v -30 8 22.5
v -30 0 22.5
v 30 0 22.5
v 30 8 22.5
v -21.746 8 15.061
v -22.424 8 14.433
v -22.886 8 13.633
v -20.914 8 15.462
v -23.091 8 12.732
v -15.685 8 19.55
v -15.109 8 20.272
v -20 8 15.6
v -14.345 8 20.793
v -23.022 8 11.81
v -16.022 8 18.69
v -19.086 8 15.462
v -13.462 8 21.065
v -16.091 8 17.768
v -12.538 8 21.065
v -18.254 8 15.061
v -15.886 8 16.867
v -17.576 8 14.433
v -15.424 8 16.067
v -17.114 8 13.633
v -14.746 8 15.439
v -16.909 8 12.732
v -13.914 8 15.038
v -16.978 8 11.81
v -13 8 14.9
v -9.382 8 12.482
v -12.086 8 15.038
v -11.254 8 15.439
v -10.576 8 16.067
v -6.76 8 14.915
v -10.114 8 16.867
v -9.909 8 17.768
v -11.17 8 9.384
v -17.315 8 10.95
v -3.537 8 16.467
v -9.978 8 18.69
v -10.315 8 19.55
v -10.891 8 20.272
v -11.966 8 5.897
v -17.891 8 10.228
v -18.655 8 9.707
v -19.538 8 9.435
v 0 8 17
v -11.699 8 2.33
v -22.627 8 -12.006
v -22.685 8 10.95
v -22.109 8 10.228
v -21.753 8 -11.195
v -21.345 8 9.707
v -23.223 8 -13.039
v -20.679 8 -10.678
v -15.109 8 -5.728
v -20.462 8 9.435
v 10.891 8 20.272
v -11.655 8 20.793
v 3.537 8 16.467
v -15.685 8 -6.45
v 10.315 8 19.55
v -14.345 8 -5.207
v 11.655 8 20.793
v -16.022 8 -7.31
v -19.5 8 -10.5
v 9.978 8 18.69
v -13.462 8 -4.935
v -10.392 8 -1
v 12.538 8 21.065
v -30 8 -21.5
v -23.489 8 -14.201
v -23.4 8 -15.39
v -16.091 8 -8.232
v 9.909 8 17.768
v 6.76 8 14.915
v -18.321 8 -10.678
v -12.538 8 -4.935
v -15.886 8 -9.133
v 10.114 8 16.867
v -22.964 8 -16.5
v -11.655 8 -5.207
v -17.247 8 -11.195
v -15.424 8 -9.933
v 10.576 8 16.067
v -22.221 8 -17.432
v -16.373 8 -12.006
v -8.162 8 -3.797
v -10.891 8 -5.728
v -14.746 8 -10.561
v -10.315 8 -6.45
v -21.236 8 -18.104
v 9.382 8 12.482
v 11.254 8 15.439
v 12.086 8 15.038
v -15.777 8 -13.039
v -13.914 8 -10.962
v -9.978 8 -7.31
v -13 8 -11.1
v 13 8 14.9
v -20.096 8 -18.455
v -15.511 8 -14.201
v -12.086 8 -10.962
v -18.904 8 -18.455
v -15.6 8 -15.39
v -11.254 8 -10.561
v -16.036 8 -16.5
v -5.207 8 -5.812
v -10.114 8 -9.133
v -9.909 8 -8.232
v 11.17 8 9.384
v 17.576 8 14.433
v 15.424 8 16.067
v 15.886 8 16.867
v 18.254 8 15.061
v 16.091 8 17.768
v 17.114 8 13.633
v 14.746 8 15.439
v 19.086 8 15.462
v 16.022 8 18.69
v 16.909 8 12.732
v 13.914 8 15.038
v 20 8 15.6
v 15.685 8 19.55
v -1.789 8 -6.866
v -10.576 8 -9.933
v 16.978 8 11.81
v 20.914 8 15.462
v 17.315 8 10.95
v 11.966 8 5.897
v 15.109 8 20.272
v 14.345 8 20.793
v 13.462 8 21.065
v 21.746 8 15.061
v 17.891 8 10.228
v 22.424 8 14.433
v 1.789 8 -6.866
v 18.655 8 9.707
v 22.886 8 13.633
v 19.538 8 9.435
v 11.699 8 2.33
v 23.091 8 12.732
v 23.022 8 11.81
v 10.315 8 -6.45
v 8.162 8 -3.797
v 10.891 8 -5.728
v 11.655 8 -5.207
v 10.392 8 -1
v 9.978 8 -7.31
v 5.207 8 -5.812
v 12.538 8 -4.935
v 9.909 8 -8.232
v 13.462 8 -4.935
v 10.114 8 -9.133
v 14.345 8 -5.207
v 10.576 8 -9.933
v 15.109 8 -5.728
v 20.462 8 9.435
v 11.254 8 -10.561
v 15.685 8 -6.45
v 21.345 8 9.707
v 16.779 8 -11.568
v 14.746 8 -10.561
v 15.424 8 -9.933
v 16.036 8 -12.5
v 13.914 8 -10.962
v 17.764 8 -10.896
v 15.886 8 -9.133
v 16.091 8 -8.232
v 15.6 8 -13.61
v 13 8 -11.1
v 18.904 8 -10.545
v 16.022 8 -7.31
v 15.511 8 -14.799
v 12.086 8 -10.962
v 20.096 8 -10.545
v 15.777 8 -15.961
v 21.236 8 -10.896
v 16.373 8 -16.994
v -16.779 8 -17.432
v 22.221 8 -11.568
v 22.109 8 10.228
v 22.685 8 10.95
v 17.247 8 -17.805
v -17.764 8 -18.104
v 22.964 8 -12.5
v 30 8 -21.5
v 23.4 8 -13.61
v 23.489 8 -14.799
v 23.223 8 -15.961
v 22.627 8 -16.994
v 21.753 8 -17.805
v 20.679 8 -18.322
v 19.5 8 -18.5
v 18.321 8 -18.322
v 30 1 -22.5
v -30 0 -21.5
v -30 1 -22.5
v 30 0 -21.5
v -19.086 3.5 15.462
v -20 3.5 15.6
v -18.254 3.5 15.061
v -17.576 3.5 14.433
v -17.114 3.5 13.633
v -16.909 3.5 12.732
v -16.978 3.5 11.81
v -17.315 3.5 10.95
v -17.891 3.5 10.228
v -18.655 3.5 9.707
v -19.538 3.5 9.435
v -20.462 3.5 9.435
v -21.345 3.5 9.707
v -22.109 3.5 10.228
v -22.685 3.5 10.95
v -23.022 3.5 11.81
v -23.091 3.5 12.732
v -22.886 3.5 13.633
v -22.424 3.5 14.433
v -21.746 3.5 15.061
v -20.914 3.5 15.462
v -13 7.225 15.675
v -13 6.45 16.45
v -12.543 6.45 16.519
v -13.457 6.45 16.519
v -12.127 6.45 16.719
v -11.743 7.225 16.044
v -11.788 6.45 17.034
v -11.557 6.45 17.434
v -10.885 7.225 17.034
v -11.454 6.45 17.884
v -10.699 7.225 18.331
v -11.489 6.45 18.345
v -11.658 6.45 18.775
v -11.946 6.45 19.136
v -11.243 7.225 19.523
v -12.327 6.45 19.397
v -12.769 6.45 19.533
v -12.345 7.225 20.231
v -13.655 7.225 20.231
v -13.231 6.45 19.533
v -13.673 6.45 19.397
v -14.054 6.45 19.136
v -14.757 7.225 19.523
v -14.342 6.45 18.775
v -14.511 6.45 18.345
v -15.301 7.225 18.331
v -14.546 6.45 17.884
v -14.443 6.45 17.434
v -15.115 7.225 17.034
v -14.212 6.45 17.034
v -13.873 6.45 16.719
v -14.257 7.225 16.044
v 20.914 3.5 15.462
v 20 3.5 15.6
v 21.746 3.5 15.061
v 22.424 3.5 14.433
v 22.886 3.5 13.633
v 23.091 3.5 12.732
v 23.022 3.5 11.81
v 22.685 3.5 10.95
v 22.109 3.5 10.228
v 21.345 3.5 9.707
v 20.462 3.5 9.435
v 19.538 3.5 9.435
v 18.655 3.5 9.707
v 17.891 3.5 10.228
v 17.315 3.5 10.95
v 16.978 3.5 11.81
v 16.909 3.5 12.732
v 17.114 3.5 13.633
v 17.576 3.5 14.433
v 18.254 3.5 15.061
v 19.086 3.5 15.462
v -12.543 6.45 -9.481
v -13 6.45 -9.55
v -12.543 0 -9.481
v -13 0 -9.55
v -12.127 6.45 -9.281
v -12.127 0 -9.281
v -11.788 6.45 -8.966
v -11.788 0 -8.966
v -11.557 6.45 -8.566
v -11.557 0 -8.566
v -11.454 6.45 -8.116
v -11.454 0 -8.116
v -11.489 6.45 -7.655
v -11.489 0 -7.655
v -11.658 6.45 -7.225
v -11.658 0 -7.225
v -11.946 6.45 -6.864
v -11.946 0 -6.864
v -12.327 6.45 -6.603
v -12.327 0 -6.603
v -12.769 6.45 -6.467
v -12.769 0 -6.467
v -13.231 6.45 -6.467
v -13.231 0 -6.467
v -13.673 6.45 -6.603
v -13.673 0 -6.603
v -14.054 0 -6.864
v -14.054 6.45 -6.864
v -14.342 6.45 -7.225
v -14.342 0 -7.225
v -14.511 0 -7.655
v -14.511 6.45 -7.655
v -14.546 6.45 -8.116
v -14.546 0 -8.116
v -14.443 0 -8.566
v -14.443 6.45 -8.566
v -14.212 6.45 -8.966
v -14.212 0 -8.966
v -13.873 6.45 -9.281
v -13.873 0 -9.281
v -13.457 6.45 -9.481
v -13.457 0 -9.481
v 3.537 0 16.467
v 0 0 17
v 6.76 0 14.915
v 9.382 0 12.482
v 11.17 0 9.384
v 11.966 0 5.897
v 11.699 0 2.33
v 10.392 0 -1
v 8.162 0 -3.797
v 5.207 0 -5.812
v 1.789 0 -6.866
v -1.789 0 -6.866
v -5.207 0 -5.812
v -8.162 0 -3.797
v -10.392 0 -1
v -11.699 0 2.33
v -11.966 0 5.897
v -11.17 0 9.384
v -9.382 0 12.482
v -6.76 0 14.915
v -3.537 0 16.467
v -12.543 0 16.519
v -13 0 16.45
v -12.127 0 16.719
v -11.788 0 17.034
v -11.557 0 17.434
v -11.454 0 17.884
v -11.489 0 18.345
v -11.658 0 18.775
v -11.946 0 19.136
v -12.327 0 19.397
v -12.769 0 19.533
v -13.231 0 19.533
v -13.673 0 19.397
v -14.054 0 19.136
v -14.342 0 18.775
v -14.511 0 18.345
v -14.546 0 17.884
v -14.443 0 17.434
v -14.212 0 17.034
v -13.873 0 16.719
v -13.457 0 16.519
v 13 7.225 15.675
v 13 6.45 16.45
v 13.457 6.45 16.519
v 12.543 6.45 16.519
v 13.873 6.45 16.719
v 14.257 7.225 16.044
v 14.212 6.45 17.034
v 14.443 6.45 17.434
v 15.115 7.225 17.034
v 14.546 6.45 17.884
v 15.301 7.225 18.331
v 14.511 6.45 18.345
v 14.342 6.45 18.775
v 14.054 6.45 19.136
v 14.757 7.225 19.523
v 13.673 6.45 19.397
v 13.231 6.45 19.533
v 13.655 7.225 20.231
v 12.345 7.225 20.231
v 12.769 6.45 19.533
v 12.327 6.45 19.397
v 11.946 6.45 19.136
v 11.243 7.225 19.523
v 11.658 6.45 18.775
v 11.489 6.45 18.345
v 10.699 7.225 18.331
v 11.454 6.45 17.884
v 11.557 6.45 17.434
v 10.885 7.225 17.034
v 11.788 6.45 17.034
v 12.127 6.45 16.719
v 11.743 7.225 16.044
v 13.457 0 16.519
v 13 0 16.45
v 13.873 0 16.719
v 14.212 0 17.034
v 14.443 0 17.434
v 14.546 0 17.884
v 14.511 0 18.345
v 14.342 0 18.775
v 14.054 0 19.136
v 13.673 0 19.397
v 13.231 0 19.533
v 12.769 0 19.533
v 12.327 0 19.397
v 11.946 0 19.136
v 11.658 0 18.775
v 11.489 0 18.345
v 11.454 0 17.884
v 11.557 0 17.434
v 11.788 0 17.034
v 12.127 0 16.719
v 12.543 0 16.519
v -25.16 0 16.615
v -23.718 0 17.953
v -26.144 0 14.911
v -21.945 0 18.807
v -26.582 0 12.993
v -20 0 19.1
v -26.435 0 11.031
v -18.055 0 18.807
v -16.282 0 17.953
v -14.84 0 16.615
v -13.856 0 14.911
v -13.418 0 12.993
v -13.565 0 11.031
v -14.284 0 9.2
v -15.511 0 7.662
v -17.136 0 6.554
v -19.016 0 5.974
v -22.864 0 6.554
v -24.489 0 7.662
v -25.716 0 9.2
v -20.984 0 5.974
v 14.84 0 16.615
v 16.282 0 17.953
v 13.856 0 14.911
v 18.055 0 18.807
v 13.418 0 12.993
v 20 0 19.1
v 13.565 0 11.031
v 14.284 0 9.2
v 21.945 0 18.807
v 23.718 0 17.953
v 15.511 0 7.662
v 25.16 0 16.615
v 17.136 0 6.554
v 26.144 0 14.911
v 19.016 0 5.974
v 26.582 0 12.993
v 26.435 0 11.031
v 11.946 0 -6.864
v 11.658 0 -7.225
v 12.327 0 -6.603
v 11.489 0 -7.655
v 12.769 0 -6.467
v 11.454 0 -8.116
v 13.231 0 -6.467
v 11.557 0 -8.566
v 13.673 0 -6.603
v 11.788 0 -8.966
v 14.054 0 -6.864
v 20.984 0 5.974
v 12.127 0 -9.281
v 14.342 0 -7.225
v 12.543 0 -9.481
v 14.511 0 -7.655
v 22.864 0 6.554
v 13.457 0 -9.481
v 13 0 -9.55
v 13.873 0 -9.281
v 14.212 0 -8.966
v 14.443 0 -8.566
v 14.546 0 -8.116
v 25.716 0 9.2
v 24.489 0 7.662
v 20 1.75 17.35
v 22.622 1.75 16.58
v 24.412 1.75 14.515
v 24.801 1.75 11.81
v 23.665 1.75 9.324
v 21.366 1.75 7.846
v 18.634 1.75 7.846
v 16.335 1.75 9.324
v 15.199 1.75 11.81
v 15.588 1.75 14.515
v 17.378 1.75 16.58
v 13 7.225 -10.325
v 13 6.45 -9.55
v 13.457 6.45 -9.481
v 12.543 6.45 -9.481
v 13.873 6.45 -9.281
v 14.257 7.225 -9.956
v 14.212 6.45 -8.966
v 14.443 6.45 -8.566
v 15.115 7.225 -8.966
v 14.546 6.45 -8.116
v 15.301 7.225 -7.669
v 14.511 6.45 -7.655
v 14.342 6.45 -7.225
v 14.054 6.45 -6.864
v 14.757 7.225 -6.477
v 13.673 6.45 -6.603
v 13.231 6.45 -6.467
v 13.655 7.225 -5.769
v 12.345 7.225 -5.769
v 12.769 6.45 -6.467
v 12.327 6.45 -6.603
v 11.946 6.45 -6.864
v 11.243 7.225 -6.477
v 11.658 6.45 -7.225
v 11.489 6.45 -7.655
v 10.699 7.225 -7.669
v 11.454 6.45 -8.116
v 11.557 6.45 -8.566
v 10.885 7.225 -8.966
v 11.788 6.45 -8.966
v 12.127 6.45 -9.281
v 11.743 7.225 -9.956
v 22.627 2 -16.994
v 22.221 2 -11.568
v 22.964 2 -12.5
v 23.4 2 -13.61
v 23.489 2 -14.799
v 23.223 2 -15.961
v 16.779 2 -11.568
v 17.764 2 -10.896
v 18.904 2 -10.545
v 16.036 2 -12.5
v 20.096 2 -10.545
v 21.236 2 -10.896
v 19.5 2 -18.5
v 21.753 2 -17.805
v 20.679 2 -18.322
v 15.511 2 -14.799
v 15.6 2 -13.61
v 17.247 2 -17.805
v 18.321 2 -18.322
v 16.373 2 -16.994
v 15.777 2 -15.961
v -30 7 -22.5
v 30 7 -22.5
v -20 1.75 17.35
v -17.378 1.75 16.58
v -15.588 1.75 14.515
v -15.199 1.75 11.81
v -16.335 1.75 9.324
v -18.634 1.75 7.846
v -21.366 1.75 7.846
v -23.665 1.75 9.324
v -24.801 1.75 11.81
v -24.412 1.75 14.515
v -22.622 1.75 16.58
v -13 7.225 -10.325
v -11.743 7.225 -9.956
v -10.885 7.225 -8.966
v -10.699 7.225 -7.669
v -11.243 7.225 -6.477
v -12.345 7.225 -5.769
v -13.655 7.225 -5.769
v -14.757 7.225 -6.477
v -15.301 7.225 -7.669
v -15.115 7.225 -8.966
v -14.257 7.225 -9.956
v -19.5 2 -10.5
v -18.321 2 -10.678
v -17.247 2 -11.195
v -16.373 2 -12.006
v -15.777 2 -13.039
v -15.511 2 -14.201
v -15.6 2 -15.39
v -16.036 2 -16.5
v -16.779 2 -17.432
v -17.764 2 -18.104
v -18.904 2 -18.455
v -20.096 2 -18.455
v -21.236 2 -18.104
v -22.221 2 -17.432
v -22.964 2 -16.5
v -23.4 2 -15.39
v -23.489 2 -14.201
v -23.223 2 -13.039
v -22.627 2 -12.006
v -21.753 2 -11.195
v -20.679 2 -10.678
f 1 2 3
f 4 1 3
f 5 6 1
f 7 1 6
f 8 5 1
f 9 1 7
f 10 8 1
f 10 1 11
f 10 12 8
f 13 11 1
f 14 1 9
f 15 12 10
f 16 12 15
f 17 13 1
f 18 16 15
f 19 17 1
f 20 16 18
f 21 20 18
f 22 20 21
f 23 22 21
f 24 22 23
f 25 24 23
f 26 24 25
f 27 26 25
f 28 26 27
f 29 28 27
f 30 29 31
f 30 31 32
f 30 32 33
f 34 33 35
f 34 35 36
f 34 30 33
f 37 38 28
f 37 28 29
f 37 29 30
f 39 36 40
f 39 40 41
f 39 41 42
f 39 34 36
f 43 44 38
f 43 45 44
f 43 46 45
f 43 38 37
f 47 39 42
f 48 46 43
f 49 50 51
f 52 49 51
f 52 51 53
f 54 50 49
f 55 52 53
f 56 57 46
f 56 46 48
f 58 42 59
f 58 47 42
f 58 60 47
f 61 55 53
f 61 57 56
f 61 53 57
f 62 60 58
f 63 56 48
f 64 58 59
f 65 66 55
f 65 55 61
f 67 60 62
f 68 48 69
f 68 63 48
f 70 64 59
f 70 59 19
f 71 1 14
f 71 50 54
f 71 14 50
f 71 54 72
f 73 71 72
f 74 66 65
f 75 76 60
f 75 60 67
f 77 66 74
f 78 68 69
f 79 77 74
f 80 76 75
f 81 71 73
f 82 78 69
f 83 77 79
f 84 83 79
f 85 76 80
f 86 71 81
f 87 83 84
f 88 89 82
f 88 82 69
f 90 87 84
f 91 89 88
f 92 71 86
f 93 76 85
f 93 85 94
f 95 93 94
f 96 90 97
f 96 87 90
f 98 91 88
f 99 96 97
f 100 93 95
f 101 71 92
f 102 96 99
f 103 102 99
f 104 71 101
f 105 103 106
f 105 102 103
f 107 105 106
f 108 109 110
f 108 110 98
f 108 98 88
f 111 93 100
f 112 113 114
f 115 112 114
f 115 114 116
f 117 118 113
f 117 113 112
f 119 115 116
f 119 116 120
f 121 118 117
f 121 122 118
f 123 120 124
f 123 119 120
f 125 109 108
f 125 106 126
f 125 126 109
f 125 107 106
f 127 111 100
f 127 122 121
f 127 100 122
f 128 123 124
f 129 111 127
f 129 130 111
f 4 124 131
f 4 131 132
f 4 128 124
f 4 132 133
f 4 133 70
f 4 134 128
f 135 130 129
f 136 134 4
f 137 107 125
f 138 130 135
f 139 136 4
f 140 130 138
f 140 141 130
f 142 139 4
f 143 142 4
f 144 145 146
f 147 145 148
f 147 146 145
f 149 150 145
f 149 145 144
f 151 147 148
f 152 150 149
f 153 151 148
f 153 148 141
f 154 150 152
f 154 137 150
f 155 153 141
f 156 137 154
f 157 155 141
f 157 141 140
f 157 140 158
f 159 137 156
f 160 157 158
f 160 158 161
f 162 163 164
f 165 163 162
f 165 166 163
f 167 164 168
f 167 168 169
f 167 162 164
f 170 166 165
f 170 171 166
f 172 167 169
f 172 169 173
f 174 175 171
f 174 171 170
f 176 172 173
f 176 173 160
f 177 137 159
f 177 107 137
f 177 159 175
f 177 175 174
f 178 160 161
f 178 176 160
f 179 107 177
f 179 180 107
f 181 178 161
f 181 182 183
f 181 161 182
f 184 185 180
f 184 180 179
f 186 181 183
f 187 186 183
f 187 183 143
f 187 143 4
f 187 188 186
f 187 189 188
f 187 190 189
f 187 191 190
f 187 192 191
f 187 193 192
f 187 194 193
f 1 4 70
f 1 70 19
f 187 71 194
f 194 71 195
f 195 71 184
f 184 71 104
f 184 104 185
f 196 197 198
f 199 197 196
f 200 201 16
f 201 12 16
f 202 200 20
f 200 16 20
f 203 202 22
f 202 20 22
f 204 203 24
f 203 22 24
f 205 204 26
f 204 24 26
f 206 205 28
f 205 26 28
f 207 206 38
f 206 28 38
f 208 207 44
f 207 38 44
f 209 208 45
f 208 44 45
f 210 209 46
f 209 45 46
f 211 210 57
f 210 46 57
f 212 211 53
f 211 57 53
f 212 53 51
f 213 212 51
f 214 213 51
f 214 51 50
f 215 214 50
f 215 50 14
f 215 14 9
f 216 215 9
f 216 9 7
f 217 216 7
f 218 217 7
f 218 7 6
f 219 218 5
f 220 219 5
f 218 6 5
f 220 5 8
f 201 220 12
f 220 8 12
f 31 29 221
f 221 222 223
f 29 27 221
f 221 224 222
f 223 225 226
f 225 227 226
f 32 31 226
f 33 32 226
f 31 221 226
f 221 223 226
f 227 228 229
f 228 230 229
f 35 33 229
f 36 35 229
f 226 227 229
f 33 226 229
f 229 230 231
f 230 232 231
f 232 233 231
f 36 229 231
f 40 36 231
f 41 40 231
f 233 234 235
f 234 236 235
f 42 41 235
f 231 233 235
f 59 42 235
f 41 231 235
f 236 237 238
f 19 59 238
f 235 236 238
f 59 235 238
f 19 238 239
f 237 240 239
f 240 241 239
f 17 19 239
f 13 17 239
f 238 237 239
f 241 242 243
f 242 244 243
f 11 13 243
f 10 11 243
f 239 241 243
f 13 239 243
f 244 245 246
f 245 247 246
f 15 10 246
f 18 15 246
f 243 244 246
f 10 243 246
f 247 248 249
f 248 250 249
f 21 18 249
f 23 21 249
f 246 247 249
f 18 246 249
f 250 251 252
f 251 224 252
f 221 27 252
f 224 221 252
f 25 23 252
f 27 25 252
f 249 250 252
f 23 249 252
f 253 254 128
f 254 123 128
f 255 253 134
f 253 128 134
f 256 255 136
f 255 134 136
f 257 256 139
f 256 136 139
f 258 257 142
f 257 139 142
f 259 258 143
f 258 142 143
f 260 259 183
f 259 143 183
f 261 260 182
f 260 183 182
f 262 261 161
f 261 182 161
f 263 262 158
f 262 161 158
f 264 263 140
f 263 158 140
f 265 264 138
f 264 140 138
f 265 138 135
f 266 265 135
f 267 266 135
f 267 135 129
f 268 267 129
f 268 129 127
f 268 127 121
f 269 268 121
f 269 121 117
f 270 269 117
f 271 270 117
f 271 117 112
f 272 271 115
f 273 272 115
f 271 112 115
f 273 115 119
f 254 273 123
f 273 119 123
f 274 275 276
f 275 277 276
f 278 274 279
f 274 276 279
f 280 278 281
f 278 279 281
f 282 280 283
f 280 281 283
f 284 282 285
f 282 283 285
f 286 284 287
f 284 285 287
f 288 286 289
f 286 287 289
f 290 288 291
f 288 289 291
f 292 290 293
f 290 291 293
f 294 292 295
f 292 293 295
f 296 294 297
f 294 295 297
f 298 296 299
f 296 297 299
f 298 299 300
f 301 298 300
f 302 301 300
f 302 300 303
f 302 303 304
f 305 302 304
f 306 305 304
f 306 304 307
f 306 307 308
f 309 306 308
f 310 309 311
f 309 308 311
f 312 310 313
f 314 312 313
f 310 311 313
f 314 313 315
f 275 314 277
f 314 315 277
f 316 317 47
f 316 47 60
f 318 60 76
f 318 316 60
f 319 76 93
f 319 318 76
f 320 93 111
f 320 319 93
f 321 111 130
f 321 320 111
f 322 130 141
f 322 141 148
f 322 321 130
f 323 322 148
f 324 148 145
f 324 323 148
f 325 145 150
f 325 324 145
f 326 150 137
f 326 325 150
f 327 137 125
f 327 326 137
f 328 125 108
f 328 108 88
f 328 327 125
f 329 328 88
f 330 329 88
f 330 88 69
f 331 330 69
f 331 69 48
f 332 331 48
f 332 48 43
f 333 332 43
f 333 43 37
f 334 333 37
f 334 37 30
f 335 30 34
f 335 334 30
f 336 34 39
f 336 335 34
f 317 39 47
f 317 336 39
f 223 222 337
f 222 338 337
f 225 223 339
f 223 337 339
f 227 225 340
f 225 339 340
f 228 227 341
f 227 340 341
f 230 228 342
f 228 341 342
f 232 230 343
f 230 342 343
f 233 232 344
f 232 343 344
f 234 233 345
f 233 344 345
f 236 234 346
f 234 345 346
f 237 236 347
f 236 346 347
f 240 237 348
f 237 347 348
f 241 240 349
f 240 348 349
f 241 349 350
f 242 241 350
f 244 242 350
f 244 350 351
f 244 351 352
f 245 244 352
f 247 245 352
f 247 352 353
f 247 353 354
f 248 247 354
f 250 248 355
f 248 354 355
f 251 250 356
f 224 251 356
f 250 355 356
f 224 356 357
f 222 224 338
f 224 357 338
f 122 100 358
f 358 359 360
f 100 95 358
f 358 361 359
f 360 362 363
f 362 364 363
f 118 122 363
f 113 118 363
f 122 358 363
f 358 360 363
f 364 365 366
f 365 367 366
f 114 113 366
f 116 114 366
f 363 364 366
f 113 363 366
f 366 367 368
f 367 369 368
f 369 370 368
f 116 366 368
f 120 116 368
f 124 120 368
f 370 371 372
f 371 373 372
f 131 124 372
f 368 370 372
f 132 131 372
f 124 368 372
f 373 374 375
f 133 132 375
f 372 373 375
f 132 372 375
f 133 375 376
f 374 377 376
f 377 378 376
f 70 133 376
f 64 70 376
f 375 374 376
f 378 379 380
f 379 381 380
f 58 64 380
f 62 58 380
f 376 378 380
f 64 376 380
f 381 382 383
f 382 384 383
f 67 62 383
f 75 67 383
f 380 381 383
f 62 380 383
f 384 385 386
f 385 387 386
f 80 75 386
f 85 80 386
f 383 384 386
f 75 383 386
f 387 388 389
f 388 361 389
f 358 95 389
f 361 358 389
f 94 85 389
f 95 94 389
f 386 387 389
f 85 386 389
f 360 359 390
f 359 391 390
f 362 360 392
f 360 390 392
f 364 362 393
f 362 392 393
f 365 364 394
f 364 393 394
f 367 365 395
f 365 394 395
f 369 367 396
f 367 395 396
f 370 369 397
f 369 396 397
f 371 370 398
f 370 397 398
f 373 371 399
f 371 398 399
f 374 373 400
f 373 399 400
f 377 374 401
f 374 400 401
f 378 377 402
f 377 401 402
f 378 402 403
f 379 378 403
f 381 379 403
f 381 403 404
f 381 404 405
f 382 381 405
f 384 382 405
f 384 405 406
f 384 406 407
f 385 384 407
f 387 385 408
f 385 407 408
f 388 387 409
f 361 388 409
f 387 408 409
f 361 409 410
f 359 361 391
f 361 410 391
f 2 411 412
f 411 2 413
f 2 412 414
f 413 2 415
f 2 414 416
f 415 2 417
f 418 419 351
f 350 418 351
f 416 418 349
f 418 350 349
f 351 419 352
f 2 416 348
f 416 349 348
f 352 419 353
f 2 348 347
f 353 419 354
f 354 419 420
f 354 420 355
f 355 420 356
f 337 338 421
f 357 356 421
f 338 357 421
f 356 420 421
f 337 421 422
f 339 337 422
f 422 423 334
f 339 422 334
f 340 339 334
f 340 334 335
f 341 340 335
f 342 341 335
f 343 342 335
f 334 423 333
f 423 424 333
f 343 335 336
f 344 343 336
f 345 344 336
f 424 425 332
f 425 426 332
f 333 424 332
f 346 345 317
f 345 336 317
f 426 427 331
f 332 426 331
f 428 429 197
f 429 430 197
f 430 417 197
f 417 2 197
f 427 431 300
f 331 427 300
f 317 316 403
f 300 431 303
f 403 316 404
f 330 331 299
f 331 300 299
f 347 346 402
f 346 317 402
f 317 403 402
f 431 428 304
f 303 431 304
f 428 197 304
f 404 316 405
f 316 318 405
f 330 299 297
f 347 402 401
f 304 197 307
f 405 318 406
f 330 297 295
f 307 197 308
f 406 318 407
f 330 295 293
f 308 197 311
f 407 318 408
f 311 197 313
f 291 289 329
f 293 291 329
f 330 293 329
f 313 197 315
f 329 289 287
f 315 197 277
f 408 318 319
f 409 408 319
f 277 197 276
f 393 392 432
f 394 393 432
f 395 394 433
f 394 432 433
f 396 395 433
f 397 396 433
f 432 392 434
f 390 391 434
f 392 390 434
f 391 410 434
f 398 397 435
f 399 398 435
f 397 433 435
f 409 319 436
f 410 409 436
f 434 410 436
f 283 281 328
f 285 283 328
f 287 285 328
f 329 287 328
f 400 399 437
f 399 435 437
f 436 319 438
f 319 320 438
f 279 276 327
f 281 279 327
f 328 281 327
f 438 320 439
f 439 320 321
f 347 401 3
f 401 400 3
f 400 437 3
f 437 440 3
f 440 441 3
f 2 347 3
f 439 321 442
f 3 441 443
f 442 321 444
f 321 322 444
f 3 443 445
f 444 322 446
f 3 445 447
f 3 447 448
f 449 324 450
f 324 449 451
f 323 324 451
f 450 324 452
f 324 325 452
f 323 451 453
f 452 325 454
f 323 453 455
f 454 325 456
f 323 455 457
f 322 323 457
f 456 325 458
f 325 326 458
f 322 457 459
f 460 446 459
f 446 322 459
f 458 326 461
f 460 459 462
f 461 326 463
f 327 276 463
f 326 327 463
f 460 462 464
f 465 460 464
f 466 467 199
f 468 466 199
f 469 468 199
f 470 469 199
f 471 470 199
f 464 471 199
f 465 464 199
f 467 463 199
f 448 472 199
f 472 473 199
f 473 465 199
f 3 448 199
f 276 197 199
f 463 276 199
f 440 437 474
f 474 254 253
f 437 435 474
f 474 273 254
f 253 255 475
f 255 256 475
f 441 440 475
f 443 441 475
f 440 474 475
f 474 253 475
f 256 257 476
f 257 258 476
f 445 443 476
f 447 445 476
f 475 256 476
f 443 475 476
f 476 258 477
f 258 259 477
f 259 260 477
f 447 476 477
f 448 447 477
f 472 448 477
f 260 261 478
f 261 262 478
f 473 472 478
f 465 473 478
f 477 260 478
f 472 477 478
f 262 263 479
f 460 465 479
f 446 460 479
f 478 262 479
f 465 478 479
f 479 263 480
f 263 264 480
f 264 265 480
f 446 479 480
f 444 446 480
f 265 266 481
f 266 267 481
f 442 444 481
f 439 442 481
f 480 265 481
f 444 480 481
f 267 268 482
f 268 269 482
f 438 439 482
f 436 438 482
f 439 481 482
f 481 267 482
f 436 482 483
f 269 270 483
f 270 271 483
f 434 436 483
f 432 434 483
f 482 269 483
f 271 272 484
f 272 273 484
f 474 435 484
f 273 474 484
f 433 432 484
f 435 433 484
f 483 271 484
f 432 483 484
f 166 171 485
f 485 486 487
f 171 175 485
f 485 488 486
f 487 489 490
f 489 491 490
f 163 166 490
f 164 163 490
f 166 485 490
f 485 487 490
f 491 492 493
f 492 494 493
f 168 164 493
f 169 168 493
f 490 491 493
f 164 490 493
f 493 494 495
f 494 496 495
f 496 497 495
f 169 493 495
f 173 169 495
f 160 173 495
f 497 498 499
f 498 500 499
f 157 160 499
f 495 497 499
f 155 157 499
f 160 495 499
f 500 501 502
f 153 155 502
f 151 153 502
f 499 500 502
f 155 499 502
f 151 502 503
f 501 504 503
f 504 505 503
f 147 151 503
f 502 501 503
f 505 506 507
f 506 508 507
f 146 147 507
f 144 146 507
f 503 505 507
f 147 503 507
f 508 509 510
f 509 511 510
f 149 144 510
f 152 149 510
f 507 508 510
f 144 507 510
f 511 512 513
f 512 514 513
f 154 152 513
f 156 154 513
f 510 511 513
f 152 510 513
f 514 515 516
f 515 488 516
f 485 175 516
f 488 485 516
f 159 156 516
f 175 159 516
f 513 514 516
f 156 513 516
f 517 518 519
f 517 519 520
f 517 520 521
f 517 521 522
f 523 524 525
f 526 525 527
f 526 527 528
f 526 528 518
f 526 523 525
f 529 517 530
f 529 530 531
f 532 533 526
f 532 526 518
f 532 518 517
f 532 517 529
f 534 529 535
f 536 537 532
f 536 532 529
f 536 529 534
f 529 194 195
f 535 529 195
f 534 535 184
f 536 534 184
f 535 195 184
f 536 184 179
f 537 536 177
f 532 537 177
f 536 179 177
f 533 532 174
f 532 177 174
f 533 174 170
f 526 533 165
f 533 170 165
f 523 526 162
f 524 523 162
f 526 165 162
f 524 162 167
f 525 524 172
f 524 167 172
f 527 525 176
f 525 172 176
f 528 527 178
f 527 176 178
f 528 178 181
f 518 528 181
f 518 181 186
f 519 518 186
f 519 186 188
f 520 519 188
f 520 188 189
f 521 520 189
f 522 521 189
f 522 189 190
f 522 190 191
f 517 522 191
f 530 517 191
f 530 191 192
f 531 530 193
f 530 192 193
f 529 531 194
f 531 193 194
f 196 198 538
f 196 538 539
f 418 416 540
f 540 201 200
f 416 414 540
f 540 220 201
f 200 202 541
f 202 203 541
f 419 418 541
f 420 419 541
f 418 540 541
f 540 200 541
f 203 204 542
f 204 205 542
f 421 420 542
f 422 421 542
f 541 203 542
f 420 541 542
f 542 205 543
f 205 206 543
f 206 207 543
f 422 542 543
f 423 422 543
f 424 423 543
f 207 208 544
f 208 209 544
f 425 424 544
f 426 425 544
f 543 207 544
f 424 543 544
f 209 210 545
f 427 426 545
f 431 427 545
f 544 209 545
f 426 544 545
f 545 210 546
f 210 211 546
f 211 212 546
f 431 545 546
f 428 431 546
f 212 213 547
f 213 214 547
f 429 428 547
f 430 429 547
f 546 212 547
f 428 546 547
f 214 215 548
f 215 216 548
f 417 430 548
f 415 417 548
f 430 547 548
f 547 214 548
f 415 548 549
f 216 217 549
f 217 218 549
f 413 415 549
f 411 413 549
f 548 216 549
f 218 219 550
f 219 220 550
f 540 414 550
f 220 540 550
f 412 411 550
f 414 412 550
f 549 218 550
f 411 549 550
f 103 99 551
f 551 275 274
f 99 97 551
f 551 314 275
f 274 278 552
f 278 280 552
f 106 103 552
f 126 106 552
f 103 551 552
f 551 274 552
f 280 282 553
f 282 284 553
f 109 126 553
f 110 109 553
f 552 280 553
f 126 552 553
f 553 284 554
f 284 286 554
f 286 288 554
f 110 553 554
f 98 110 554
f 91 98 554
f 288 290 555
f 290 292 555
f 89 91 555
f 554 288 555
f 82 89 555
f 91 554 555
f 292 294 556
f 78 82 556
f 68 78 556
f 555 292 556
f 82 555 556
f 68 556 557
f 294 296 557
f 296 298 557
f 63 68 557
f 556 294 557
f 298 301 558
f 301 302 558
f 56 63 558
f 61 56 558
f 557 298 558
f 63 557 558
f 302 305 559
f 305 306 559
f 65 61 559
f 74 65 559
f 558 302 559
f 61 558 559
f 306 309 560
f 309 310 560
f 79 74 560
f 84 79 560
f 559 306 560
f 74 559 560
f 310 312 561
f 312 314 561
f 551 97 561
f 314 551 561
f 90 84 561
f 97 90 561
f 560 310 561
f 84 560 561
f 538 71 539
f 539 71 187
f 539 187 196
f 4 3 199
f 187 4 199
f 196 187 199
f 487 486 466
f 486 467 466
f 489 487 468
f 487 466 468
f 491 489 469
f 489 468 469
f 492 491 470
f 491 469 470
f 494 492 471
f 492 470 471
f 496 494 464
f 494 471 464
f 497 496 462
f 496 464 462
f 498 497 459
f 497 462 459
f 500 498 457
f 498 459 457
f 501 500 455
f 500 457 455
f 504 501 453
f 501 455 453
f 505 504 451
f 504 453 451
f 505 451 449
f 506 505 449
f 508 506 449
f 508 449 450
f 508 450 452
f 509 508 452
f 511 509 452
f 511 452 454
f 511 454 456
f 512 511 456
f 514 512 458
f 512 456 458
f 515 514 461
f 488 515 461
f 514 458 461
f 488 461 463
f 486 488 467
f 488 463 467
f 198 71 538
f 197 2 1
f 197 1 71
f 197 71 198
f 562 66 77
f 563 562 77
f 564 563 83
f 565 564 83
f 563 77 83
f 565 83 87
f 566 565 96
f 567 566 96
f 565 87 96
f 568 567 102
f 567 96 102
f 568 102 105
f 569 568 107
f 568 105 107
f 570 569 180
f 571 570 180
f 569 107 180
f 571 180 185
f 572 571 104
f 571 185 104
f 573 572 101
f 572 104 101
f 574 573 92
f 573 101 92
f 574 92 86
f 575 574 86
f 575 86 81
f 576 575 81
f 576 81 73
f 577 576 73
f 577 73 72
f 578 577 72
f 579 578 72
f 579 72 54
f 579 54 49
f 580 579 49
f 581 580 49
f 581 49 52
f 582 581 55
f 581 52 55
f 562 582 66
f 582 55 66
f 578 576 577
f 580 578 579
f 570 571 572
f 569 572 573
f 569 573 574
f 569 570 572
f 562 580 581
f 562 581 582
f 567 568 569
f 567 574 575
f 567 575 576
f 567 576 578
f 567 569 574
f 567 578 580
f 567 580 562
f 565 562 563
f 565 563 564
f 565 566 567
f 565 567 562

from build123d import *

# Parameters (mm, degrees)
SKETCH_1_W                  = 60
SKETCH_1_H                  = 45
SKETCH_1_R                  = 2.5
SKETCH_1_R_2                = 12
EXTRUDE_1_DEPTH             = 8
CHAMFER_1_SIZE              = 1
SKETCH_2_R                  = 4
CUT_EXTRUDE_1_DEPTH         = 6
SKETCH_3_R                  = 1.25
CUT_EXTRUDE_2_DEPTH         = 39.34383914
HOLE_WIZARD_2_D             = 6.2
HOLE_WIZARD_2_CSINK_D       = 13.2
HOLE_WIZARD_2_CSINK_ANGLE   = 90
HOLE_WIZARD_2_2_D           = 3.1
HOLE_WIZARD_2_2_CSINK_D     = 6.2
HOLE_WIZARD_2_2_CSINK_ANGLE = 90


with BuildPart() as part:
    # 草图1 → 凸台-拉伸1 (new body)
    with BuildSketch(Plane(origin=(0, 0, 0), x_dir=(1, 0, 0), z_dir=(0, 1, 0))):
        Rectangle(SKETCH_1_W, SKETCH_1_H)
        with Locations(Location((-20, -12.5, 0), (0, 0, 270))):
            Circle(SKETCH_1_R, mode=Mode.SUBTRACT)
        with Locations(Location((20, -12.5, 0), (0, 0, 90))):
            Circle(SKETCH_1_R, mode=Mode.SUBTRACT)
        with Locations(Location((0, -5, 0), (0, 0, 270))):
            Circle(SKETCH_1_R_2, mode=Mode.SUBTRACT)
    extrude(amount=EXTRUDE_1_DEPTH)

    # 倒角1
    chamfer_1_edges = [part.edges().sort_by_distance(p)[0] for p in [
        (0, 8, -22.5),
        (0, 0, -22.5),
    ]]
    chamfer(chamfer_1_edges, length=CHAMFER_1_SIZE)

    # 草图2 → 切除-拉伸1 (cut)
    with BuildSketch(Plane(origin=(0, 8, 0), x_dir=(1, 0, 0), z_dir=(0, 1, 0))):
        with Locations(Location((-19.5, 14.5, 0), (0, 0, 270))):
            Circle(SKETCH_2_R)
        with Locations(Location((19.5, 14.5, 0), (0, 0, 90))):
            Circle(SKETCH_2_R)
    extrude(amount=-CUT_EXTRUDE_1_DEPTH, mode=Mode.SUBTRACT)

    # 草图3 → 切除-拉伸2 (cut, through all)
    with BuildSketch(Plane(origin=(0, 0, 0), x_dir=(-1, 0, 0), z_dir=(0, -1, 0))):
        with Locations(Location((13, -18, 0), (0, 0, 90))):
            Circle(SKETCH_3_R)
        with Locations(Location((-13, -18, 0), (0, 0, 270))):
            Circle(SKETCH_3_R)
        with Locations(Location((13, 8, 0), (0, 0, 90))):
            Circle(SKETCH_3_R)
        with Locations(Location((-13, 8, 0), (0, 0, 270))):
            Circle(SKETCH_3_R)
    extrude(amount=-CUT_EXTRUDE_2_DEPTH, mode=Mode.SUBTRACT)

    # Hole Wizard 2 (through all)
    with Locations(Plane(origin=(20, 0, 12.5), x_dir=(0, 0, -1), z_dir=(0, -1, 0))):
        with Locations((0, 0), (0, -40)):
            CounterSinkHole(HOLE_WIZARD_2_D / 2, HOLE_WIZARD_2_CSINK_D / 2, counter_sink_angle=HOLE_WIZARD_2_CSINK_ANGLE)

    # Hole Wizard 2 2 (through all)
    with Locations(Plane(origin=(-13, 8, -8), x_dir=(0, 0, 1), z_dir=(0, 1, 0))):
        with Locations((0, 0), (26, 0), (26, 26), (0, 26)):
            CounterSinkHole(HOLE_WIZARD_2_2_D / 2, HOLE_WIZARD_2_2_CSINK_D / 2, counter_sink_angle=HOLE_WIZARD_2_2_CSINK_ANGLE)


solid = part.part
